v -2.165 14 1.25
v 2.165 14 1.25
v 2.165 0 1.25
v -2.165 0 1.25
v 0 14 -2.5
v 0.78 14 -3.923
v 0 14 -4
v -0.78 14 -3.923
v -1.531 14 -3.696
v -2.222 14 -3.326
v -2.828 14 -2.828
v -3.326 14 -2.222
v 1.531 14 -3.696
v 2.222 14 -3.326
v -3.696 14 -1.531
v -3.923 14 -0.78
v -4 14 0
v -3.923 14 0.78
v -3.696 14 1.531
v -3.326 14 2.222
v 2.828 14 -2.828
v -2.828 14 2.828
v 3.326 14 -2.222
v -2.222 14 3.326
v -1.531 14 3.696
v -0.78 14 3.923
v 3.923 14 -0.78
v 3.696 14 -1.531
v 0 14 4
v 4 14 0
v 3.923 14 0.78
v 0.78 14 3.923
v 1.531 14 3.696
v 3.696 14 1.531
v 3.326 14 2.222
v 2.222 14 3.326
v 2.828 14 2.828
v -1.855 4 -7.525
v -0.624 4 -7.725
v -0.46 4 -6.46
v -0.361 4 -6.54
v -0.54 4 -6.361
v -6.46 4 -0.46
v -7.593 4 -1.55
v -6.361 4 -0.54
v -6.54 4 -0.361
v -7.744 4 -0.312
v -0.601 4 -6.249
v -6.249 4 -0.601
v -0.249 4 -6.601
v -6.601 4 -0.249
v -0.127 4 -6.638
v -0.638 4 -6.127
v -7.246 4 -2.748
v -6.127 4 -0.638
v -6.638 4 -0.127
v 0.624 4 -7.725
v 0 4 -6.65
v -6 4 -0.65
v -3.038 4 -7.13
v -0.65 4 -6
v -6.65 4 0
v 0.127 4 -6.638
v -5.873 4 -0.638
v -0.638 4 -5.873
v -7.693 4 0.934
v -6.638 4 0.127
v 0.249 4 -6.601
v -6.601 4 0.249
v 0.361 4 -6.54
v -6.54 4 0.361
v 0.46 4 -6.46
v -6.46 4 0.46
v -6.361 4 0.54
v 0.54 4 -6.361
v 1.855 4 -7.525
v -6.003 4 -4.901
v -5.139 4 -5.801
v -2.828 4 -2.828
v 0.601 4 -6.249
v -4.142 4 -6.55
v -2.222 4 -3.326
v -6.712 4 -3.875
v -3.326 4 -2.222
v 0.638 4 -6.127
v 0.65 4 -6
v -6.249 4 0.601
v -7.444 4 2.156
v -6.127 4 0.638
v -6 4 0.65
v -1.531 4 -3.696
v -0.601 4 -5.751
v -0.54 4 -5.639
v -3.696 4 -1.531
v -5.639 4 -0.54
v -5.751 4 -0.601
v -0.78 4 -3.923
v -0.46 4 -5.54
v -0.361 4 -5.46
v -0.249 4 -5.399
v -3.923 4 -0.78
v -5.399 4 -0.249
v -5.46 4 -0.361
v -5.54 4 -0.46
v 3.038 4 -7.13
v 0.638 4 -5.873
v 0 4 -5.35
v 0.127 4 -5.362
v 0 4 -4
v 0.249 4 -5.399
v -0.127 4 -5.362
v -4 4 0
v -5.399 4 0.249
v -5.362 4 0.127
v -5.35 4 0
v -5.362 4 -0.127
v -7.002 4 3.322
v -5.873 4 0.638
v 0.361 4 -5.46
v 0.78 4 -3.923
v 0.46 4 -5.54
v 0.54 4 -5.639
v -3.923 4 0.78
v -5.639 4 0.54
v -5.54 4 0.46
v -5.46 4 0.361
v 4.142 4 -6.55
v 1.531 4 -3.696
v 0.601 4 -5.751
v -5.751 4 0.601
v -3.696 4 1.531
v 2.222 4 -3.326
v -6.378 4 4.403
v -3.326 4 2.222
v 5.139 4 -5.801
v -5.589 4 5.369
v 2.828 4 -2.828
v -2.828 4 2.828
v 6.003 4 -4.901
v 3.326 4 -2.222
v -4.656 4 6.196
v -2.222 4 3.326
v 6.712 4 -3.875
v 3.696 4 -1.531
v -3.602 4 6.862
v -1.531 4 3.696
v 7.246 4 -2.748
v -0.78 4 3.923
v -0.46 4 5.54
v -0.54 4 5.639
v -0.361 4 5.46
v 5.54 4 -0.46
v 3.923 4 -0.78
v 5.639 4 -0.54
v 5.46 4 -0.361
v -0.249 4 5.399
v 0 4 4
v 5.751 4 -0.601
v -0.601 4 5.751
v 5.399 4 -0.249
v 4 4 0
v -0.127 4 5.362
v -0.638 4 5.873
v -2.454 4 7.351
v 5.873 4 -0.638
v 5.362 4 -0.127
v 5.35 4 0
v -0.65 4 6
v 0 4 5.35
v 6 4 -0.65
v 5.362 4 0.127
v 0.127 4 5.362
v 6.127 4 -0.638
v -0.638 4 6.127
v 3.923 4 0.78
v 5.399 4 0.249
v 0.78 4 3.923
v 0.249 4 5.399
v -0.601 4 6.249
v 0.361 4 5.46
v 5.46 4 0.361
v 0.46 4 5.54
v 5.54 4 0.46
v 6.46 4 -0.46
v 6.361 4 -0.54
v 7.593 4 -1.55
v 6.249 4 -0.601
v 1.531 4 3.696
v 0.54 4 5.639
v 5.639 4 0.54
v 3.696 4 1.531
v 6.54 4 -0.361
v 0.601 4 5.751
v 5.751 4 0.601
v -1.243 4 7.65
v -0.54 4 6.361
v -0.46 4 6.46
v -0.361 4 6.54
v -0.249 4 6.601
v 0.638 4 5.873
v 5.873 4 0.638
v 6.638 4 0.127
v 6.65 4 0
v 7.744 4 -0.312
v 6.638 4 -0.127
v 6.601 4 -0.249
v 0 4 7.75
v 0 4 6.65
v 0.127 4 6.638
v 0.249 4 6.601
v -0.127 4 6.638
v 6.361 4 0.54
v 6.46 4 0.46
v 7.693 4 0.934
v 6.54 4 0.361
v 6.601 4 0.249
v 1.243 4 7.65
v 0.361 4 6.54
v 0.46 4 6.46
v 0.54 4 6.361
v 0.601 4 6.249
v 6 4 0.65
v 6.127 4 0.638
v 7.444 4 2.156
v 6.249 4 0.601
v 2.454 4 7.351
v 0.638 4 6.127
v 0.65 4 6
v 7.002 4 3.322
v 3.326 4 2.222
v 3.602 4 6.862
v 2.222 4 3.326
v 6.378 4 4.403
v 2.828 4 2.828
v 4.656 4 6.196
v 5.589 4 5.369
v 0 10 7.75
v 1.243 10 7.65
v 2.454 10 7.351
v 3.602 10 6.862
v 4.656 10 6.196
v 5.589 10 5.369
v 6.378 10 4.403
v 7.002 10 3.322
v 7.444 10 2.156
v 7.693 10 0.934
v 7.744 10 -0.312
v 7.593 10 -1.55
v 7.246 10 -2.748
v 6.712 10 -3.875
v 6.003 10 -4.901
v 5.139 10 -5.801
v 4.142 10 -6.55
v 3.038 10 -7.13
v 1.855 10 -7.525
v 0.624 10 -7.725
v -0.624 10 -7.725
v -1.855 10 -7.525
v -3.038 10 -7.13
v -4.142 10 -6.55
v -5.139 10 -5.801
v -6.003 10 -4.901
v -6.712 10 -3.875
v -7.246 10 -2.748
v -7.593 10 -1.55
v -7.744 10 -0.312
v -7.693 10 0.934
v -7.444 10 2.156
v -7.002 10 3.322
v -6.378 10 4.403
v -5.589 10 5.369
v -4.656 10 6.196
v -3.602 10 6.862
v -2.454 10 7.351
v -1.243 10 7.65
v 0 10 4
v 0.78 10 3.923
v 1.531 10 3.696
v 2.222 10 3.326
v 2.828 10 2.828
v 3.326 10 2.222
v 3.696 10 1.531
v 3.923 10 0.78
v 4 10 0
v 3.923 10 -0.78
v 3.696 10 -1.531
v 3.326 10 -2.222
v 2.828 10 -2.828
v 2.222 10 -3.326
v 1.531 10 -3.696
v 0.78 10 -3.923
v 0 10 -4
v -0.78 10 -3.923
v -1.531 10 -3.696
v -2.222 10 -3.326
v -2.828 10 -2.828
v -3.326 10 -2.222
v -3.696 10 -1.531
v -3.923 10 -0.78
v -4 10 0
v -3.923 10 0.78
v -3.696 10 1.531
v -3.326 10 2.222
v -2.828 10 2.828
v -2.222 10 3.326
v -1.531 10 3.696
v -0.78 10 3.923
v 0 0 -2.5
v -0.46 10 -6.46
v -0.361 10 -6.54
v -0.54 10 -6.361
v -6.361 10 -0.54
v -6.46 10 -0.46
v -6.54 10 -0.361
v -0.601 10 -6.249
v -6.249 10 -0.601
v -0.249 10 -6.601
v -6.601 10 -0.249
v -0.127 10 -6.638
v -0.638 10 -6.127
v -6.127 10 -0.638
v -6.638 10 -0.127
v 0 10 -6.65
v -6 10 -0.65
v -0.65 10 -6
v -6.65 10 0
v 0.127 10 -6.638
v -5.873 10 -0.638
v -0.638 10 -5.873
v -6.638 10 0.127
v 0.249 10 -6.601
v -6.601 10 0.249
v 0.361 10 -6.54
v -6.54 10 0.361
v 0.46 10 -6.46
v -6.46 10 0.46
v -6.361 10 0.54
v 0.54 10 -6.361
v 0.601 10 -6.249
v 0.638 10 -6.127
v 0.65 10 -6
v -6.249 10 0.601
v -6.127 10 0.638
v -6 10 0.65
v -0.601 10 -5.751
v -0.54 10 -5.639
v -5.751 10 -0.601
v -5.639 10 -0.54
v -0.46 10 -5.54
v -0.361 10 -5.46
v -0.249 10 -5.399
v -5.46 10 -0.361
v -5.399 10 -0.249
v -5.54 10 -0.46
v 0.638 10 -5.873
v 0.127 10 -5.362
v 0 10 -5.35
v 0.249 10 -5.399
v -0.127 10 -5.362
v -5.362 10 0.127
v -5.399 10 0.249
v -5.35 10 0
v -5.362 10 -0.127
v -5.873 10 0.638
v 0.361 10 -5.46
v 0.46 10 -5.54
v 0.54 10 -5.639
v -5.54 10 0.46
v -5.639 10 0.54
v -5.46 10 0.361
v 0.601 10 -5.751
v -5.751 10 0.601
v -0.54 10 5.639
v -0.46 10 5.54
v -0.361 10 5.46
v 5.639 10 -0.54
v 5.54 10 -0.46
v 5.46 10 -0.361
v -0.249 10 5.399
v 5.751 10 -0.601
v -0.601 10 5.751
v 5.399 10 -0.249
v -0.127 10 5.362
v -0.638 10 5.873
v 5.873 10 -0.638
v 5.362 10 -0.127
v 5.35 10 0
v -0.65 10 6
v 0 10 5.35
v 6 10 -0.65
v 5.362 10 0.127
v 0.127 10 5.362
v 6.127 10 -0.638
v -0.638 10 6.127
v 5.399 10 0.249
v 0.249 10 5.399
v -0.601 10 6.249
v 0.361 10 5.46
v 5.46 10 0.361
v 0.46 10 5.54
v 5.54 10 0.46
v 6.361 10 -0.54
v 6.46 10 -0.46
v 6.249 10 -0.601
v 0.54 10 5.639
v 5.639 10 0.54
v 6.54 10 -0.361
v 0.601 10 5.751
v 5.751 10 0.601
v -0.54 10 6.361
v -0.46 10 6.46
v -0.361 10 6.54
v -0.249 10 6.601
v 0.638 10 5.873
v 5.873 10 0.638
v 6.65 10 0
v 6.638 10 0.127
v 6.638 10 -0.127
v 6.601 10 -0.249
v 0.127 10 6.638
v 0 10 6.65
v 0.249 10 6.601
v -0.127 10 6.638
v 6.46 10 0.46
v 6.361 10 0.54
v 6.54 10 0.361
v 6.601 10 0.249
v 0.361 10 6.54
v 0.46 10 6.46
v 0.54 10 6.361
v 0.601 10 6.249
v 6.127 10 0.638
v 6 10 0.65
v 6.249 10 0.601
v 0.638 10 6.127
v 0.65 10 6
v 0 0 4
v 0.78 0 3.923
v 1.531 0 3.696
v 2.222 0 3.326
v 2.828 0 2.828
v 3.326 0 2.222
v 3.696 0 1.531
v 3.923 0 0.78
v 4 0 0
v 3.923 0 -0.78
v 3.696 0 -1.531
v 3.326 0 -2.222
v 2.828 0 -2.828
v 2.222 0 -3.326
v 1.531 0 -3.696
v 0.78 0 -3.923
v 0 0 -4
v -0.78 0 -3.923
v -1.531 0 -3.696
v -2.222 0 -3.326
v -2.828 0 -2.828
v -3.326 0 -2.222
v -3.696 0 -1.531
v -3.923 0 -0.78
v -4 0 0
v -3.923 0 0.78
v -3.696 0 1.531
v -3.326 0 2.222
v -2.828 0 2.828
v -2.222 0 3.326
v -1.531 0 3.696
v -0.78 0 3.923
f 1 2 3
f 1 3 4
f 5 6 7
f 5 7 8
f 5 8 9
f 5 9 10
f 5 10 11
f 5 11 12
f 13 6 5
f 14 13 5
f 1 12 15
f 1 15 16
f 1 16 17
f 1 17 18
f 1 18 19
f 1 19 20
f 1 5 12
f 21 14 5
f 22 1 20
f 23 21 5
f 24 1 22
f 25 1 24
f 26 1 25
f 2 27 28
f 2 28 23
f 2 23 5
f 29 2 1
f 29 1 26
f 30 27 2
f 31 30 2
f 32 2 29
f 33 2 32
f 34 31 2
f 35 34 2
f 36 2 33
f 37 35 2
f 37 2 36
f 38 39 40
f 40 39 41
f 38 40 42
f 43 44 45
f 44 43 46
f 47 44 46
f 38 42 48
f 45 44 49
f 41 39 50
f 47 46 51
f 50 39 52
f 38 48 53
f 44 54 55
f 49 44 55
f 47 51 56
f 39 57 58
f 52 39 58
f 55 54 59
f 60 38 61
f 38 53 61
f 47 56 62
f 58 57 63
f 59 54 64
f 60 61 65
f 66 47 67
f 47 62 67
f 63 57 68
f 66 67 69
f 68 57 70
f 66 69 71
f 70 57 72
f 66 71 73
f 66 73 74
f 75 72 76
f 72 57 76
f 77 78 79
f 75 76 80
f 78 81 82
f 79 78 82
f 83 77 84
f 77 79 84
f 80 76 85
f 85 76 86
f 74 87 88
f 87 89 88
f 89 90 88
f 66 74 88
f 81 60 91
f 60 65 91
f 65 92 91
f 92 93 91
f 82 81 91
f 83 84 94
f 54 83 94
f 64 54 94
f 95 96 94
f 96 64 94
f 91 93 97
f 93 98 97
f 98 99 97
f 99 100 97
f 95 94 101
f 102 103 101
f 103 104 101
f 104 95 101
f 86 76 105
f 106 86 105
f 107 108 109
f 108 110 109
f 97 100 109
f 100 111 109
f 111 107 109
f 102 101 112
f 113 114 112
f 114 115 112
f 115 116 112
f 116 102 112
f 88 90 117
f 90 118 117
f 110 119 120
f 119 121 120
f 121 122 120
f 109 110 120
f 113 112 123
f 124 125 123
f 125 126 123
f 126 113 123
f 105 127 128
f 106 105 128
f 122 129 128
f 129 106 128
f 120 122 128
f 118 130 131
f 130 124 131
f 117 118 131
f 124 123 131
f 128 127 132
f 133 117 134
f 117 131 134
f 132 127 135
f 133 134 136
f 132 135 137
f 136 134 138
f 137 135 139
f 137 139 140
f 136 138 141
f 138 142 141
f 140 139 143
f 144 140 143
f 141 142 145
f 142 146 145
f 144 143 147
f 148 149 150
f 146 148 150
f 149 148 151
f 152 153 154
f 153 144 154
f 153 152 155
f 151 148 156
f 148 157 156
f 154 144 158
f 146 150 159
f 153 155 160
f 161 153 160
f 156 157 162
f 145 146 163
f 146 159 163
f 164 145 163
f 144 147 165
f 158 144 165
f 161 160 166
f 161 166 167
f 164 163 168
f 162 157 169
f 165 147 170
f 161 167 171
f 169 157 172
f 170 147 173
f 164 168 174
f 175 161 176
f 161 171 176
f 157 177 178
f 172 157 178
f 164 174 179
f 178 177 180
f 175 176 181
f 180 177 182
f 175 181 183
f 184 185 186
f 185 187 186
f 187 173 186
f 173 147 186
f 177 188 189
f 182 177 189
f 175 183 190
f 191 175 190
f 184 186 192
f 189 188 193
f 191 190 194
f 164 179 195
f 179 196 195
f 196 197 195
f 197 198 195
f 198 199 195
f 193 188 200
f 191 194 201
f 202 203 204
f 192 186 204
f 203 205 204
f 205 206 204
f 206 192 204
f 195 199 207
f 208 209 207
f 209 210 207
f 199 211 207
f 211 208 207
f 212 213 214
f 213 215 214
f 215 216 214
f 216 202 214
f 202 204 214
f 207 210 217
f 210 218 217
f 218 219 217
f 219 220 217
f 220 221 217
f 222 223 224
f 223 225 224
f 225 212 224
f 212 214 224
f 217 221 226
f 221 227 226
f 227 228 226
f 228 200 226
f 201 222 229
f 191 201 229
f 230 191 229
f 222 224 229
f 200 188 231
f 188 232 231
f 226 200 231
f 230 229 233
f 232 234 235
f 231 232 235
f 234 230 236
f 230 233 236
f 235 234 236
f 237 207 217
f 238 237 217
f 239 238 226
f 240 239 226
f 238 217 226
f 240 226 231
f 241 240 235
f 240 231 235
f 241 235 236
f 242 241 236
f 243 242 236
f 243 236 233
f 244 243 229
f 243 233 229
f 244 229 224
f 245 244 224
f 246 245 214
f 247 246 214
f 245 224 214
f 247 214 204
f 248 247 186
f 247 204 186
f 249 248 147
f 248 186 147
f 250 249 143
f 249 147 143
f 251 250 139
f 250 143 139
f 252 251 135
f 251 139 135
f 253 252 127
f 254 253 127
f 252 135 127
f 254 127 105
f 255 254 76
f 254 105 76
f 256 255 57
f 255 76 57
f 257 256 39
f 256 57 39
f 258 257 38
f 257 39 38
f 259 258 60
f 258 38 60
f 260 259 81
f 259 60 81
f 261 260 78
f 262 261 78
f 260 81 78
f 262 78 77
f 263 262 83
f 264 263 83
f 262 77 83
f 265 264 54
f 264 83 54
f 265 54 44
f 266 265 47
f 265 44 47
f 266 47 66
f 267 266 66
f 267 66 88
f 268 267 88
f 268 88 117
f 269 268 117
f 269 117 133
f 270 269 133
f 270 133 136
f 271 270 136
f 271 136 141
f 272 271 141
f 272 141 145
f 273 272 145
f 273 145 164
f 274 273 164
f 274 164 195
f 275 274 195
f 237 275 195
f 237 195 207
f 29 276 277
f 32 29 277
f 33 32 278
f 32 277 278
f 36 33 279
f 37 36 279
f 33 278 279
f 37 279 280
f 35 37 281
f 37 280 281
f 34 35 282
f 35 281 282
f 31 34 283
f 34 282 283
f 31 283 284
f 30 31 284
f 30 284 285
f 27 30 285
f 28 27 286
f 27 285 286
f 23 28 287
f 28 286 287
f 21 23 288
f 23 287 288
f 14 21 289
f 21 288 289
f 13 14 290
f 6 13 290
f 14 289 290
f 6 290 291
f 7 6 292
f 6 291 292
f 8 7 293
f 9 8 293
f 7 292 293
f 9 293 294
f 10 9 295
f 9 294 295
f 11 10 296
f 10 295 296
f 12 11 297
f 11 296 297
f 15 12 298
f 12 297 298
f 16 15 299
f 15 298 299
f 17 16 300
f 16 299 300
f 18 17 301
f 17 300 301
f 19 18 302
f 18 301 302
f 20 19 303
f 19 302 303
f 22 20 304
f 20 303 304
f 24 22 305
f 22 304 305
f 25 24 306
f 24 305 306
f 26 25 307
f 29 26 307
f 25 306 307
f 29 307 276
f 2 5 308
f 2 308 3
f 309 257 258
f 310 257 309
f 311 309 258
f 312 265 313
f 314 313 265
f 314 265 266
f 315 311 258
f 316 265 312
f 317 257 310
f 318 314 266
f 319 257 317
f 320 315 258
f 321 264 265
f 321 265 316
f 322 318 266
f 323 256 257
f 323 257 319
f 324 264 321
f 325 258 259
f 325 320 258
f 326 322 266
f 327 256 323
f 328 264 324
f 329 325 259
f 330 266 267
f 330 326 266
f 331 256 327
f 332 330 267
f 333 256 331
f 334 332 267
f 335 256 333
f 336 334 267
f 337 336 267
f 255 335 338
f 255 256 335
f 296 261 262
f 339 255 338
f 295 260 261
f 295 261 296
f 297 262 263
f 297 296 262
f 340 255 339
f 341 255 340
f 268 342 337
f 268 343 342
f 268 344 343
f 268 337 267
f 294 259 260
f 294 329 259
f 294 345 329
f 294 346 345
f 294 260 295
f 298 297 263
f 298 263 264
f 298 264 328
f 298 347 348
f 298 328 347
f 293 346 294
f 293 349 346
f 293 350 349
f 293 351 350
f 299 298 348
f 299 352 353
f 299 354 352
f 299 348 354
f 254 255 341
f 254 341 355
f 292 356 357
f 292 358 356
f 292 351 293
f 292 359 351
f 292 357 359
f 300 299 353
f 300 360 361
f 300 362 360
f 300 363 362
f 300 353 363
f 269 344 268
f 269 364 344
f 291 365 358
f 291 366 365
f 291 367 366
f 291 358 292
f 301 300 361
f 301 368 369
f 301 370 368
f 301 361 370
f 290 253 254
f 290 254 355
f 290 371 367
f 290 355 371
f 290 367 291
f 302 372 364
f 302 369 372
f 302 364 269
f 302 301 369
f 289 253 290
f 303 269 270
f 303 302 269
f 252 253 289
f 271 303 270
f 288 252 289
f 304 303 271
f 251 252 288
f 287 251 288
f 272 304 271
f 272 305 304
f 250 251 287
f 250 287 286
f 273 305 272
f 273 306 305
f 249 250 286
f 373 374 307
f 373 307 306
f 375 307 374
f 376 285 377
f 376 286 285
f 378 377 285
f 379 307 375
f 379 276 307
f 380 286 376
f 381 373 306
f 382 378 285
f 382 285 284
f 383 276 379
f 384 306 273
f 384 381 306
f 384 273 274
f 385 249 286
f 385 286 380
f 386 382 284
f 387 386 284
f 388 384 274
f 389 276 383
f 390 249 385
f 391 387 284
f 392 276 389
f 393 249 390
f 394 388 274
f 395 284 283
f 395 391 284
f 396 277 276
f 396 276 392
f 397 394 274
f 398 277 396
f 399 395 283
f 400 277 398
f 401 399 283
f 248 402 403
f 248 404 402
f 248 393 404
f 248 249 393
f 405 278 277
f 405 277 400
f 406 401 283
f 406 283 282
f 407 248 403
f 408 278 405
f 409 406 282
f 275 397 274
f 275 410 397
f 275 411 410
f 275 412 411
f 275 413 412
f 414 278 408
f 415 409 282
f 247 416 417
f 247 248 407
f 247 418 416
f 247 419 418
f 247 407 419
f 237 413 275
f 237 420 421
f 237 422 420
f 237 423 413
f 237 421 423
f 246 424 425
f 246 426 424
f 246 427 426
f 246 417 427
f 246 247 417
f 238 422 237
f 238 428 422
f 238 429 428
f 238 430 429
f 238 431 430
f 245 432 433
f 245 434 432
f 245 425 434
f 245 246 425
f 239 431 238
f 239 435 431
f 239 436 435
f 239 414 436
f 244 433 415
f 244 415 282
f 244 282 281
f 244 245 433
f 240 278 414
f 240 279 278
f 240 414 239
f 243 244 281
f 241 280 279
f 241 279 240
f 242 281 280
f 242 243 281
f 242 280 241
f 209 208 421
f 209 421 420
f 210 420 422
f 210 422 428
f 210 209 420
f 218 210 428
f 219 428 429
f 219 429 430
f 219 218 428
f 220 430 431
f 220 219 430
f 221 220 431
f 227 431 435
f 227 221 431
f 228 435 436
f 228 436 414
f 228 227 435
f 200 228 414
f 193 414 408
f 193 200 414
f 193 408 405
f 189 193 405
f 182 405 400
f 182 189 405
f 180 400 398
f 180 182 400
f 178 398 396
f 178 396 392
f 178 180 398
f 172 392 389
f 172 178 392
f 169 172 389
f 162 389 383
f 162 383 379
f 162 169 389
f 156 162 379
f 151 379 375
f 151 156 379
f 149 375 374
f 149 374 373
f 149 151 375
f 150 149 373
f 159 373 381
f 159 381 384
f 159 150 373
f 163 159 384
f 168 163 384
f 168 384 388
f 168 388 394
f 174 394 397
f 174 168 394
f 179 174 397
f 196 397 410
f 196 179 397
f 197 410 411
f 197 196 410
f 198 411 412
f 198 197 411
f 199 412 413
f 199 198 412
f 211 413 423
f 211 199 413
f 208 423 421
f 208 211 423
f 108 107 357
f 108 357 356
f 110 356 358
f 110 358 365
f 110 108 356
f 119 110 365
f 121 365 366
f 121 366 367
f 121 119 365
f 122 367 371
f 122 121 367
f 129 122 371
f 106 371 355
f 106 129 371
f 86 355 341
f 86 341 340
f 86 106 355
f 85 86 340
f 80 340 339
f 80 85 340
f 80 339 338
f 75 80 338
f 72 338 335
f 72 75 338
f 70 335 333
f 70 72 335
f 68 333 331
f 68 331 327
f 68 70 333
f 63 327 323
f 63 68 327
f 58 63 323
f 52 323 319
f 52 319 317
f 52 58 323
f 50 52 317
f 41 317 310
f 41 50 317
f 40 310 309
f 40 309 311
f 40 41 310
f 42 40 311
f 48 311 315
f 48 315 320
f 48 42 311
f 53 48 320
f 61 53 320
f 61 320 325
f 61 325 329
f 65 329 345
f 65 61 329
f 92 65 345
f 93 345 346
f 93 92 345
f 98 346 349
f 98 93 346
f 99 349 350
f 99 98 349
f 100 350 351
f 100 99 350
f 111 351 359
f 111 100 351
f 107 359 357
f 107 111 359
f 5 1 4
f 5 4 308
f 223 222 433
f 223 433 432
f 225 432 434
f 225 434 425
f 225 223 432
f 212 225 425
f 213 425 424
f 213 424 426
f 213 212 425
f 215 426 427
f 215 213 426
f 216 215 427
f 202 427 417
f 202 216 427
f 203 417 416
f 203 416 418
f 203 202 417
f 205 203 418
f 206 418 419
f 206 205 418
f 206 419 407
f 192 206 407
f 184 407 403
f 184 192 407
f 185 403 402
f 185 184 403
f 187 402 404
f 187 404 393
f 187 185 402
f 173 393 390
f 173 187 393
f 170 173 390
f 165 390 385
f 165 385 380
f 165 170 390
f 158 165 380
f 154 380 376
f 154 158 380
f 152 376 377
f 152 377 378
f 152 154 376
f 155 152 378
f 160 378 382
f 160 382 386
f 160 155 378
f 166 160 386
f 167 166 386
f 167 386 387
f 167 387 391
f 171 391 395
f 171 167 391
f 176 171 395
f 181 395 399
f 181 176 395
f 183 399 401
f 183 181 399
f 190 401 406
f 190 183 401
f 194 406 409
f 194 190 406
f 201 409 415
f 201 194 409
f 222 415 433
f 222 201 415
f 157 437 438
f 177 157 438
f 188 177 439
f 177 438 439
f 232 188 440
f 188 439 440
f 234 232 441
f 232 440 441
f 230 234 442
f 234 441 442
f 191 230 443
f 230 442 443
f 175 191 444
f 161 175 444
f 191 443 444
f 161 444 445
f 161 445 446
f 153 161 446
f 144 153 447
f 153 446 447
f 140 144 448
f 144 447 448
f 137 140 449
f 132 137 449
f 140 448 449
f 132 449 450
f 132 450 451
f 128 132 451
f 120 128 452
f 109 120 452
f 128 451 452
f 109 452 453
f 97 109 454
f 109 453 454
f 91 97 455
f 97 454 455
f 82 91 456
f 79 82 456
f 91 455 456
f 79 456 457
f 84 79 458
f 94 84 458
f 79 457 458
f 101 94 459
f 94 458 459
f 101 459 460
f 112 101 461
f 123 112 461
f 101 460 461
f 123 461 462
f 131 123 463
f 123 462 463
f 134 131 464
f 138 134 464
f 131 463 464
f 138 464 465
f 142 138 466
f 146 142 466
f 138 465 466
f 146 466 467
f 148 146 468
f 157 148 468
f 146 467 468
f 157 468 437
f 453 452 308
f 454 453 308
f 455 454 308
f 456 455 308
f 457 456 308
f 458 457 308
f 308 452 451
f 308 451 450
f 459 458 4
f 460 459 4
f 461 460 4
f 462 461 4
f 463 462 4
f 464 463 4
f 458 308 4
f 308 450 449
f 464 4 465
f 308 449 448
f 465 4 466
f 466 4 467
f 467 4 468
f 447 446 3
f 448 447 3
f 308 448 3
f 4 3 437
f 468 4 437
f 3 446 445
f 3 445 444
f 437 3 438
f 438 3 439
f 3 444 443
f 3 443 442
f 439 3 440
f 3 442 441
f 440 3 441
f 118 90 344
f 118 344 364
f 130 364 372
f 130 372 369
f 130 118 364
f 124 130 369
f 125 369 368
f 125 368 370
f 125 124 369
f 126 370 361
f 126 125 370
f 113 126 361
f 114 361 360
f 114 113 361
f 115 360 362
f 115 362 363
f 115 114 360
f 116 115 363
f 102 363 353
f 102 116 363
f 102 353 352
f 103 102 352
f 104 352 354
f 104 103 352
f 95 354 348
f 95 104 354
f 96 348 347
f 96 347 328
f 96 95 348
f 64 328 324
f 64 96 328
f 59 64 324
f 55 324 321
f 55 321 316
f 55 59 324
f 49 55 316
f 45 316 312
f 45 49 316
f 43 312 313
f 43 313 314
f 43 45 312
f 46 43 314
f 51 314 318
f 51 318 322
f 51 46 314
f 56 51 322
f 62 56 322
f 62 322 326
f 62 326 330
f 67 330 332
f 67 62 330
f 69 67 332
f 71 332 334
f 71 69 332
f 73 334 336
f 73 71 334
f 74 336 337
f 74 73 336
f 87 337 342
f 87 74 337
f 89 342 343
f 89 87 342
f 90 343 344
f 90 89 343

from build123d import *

# Parameters (mm, degrees)
SKETCH1_R           = 4
BOSS_EXTRUDE1_DEPTH = 4
SKETCH2_R           = 7.75
SKETCH2_R_2         = 0.65
BOSS_EXTRUDE2_DEPTH = 6
SKETCH3_R           = 4
BOSS_EXTRUDE3_DEPTH = 4
CUT_EXTRUDE1_DEPTH  = 24


with BuildPart() as part:
    # Sketch1 → Boss-Extrude1 (new body)
    with BuildSketch(Plane(origin=(0, 0, 0), x_dir=(1, 0, 0), z_dir=(0, 1, 0))):
        with Locations(Location((0, 0, 0), (0, 0, 270))):
            Circle(SKETCH1_R)
    extrude(amount=BOSS_EXTRUDE1_DEPTH)

    # Sketch2 → Boss-Extrude2 (add)
    with BuildSketch(Plane(origin=(0, 4, 0), x_dir=(1, 0, 0), z_dir=(0, 1, 0))):
        with Locations(Location((0, 0, 0), (0, 0, 270))):
            Circle(SKETCH2_R)
        with Locations(Location((0, 6, 0), (0, 0, 270))):
            Circle(SKETCH2_R_2, mode=Mode.SUBTRACT)
        with Locations(Location((6, 0, 0), (0, 0, 270))):
            Circle(SKETCH2_R_2, mode=Mode.SUBTRACT)
        with Locations(Location((0, -6, 0), (0, 0, 270))):
            Circle(SKETCH2_R_2, mode=Mode.SUBTRACT)
        with Locations(Location((-6, 0, 0), (0, 0, 270))):
            Circle(SKETCH2_R_2, mode=Mode.SUBTRACT)
    extrude(amount=BOSS_EXTRUDE2_DEPTH)

    # Sketch3 → Boss-Extrude3 (add)
    with BuildSketch(Plane(origin=(0, 10, 0), x_dir=(1, 0, 0), z_dir=(0, 1, 0))):
        with Locations(Location((0, 0, 0), (0, 0, 270))):
            Circle(SKETCH3_R)
    extrude(amount=BOSS_EXTRUDE3_DEPTH)

    # Sketch4 → Cut-Extrude1 (cut)
    with BuildSketch(Plane(origin=(0, 14, 0), x_dir=(1, 0, 0), z_dir=(0, 1, 0))):
        Polygon((0, 2.5), (2.165063509, -1.25), (-2.165063509, -1.25), align=None)
    extrude(amount=-CUT_EXTRUDE1_DEPTH, mode=Mode.SUBTRACT)


solid = part.part
